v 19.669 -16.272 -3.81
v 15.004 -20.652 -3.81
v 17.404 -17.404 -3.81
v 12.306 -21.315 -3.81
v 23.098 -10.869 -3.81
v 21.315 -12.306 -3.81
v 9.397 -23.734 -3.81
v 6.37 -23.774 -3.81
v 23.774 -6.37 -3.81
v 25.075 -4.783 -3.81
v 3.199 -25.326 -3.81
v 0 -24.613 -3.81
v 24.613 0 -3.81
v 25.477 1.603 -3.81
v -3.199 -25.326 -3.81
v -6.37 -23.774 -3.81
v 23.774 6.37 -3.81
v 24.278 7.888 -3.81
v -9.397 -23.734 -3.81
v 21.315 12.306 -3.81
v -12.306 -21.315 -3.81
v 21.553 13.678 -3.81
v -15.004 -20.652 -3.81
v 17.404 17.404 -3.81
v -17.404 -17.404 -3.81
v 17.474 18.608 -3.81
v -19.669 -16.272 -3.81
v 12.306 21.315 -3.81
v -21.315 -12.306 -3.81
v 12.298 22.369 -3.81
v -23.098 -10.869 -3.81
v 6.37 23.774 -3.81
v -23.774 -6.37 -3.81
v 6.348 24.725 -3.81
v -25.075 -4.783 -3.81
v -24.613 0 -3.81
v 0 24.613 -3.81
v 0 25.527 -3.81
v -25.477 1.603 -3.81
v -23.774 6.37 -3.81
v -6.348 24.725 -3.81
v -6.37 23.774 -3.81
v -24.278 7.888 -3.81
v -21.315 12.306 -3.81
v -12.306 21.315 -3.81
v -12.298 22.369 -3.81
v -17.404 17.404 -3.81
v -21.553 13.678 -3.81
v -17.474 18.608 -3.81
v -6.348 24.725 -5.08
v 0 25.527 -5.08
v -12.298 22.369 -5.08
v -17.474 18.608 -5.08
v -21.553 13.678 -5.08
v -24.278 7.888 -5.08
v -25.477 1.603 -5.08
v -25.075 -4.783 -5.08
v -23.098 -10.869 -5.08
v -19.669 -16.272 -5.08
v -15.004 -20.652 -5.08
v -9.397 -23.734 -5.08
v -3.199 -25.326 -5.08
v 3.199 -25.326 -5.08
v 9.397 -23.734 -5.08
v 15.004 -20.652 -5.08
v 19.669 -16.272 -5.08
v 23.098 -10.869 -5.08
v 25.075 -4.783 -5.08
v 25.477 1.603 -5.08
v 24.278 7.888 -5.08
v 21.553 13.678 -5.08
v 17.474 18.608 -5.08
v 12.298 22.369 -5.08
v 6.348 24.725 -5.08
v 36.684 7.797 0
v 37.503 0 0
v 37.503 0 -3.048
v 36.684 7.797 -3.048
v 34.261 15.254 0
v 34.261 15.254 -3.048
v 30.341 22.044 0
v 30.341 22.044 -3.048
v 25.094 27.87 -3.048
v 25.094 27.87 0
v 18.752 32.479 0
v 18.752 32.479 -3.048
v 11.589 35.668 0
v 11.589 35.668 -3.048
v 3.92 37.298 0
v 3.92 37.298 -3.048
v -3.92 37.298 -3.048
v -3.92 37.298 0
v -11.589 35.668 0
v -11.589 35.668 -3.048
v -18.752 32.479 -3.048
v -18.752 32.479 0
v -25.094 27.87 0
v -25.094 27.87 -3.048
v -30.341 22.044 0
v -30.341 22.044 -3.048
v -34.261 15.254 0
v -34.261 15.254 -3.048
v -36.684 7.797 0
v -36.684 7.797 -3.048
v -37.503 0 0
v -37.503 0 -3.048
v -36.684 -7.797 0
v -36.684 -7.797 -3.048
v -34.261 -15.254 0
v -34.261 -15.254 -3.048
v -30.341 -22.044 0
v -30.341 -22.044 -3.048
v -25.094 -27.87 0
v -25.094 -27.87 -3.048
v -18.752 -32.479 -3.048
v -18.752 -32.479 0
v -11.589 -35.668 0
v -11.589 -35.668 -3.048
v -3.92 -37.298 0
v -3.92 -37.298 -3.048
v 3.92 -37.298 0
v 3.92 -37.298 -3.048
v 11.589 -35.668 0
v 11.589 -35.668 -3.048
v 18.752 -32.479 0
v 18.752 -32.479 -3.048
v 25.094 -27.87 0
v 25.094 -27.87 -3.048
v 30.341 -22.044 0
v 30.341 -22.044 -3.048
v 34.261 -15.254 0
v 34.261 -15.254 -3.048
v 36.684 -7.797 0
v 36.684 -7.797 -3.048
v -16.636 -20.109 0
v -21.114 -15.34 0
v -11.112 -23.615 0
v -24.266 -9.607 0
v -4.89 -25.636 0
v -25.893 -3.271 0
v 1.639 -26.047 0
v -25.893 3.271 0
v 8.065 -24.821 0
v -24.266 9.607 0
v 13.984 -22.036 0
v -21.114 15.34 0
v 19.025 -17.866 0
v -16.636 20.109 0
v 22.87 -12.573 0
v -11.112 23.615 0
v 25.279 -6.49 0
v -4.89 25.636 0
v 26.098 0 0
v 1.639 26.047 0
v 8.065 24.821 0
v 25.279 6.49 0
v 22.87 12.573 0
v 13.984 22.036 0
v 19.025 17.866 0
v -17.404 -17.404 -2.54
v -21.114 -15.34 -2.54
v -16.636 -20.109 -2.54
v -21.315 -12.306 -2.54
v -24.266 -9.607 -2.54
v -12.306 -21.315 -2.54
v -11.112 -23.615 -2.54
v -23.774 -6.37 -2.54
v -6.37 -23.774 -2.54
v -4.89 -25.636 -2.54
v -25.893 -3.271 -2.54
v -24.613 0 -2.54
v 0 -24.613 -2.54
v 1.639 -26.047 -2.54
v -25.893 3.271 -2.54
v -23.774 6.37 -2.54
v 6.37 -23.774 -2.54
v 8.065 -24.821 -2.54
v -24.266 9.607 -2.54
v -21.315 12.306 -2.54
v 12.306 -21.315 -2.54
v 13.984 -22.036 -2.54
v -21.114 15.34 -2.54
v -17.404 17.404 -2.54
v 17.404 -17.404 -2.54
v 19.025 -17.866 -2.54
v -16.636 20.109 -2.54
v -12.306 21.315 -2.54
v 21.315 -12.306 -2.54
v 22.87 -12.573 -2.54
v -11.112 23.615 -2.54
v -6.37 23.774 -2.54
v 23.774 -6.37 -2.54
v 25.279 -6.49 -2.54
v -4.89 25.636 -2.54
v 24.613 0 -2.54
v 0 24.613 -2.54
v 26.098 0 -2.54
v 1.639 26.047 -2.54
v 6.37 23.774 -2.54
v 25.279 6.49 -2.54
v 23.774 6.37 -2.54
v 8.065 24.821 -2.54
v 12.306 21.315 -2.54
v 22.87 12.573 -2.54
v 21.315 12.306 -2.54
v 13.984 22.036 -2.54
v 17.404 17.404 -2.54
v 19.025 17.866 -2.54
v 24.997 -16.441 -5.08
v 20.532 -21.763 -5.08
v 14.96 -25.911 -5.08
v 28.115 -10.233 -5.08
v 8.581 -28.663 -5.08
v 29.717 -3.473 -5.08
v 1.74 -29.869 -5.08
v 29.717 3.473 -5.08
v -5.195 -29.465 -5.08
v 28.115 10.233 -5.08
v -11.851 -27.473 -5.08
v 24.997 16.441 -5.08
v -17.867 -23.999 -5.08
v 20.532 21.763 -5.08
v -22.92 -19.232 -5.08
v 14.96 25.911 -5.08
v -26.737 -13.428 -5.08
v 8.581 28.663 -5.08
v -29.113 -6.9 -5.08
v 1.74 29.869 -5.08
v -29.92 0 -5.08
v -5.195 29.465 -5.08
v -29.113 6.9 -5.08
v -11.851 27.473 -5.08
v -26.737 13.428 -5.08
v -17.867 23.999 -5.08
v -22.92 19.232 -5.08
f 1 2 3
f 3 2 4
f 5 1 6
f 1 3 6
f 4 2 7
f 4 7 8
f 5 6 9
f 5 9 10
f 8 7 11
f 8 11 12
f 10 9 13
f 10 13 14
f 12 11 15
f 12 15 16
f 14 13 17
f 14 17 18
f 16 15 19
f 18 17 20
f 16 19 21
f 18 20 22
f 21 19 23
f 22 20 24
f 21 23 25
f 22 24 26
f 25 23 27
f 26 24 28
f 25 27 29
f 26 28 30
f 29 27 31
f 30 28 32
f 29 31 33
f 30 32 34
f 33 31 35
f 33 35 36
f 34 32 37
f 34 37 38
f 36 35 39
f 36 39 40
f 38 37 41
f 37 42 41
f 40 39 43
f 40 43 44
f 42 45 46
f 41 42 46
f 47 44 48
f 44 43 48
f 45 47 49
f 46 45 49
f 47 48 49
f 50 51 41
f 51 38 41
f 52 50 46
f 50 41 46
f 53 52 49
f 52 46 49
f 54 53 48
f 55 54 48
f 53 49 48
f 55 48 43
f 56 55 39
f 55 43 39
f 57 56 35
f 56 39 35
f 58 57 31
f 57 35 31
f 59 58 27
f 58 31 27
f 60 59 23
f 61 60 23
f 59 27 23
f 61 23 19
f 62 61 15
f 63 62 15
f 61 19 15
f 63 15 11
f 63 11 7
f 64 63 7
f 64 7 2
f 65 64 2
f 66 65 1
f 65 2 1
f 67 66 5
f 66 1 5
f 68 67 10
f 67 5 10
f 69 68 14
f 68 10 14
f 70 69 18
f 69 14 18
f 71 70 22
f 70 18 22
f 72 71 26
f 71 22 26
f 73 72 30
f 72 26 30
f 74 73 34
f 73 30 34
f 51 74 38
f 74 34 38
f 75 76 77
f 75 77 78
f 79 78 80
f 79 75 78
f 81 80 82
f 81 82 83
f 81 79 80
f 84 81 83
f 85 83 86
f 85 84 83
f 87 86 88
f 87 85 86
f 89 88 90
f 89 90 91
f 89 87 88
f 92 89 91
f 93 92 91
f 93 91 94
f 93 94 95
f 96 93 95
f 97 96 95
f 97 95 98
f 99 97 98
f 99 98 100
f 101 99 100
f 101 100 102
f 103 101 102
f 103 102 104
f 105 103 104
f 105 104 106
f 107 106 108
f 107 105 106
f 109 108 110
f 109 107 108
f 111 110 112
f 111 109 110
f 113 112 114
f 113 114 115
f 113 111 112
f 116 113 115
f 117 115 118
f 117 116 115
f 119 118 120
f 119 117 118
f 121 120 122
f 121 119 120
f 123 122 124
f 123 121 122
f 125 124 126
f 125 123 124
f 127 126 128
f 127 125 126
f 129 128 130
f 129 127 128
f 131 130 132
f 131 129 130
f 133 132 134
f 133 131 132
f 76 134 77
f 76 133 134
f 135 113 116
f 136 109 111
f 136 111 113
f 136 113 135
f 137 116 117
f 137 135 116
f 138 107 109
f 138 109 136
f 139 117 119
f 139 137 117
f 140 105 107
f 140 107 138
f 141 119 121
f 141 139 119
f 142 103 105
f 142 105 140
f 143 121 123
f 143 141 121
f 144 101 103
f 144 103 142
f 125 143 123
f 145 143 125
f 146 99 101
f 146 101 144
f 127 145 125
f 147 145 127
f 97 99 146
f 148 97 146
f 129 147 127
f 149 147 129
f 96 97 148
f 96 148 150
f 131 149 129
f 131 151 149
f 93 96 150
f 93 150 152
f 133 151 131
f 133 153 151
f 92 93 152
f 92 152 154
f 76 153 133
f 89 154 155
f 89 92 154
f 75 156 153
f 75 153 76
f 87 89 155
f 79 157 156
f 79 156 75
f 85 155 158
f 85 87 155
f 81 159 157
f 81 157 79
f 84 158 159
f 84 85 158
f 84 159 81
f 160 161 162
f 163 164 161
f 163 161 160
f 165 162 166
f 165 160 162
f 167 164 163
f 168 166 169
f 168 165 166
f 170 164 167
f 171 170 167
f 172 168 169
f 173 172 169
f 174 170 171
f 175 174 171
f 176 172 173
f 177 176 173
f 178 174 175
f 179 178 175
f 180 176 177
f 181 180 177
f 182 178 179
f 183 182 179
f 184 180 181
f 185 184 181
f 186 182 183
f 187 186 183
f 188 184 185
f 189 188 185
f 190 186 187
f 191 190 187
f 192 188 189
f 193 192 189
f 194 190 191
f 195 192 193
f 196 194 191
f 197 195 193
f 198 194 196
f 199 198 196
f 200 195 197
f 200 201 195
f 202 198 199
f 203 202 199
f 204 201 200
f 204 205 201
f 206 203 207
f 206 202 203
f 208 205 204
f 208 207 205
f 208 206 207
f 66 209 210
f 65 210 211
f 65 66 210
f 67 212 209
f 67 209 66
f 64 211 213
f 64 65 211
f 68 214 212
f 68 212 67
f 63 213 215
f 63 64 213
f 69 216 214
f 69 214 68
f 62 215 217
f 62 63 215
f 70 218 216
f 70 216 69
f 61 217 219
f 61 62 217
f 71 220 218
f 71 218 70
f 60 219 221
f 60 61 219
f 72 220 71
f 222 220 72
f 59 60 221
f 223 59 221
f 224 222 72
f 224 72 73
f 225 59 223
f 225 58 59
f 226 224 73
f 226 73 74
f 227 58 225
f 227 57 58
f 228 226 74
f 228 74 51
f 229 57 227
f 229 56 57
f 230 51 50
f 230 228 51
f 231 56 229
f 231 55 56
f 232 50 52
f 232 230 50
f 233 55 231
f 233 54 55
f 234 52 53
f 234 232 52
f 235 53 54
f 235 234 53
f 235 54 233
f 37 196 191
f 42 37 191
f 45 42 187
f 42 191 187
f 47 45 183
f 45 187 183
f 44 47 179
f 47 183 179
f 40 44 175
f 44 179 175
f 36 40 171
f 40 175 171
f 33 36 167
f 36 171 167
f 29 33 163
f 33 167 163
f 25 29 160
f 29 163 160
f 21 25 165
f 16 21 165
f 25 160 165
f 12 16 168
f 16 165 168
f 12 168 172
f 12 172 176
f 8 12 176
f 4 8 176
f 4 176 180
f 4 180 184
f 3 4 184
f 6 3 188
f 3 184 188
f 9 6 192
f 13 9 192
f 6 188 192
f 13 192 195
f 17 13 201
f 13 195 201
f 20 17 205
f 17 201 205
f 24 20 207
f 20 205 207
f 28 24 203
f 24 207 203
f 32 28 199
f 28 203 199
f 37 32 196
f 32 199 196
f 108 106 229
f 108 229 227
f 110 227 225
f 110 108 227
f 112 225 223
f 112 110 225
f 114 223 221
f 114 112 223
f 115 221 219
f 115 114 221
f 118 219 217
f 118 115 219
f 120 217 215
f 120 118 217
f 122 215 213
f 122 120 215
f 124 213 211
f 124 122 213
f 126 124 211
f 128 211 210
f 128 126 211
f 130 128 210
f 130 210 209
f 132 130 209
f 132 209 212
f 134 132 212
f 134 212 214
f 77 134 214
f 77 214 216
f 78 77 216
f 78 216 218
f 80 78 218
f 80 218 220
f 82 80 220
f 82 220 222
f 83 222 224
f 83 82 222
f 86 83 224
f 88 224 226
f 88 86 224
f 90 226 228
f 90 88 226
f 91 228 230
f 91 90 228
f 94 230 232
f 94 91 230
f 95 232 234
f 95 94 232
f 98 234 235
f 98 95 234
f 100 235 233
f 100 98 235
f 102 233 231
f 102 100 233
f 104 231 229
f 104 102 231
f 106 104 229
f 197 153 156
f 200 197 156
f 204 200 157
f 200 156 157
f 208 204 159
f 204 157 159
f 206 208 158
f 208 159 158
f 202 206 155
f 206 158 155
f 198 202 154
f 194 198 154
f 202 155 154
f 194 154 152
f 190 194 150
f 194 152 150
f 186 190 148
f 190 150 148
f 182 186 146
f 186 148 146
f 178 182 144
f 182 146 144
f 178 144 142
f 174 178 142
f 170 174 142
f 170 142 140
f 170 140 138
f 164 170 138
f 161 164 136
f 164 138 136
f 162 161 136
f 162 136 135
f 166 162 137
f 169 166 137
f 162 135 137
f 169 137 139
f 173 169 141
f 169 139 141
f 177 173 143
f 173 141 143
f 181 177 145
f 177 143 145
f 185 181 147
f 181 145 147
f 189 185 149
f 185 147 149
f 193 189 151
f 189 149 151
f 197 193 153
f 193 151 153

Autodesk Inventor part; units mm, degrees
ref_plane "YZ Plane" through (0, 0, 0) normal (1, 0, 0) x (0, 1, 0)
ref_plane "XZ Plane" through (0, 0, 0) normal (0, 1, 0) x (-1, 0, 0)
ref_plane "XY Plane" through (0, 0, 0) normal (0, 0, 1) x (1, 0, 0)
sketch "Sketch2" plane through (0, 0, 0) normal (0, 0, 1) x (1, 0, 0)
  circle A0 centre (0, 0) radius 37.5031
  dimension "d0" = 75.0062
extrude "Extrusion1" add sketch "Sketch2" against normal blind 3.048
sketch "Sketch3" plane through (0, 0, -3.048) normal (0, 0, -1) x (-1, 0, 0)
  circle A0 centre (0, 0) radius 37.5031 projected
extrude "Extrusion2" add sketch "Sketch3" along normal blind 2.032 draft -75
sketch "Sketch4" plane through (0, 0, 0) normal (0, 0, 1) x (1, 0, 0)
  circle A0 centre (0, 0) radius 37.5031 projected
  circle A1 centre (0, 0) radius 26.0985
  dimension "d5" = 52.197
extrude "Extrusion3" cut sketch "Sketch4" against normal blind 2.54 contours A1
sketch "Sketch5" plane through (0, 0, -5.08) normal (0, 0, -1) x (-1, 0, 0)
  circle A0 centre (0, 0) radius 29.9196 projected
hole "Hole1" at (0, 0, -5.08) direction (0, 0, 1) diameter 49.2252 end through all counterbore diameter 51.054 counterbore depth 1.27
properties part number "4000120" material "304L Stainless Steel"
